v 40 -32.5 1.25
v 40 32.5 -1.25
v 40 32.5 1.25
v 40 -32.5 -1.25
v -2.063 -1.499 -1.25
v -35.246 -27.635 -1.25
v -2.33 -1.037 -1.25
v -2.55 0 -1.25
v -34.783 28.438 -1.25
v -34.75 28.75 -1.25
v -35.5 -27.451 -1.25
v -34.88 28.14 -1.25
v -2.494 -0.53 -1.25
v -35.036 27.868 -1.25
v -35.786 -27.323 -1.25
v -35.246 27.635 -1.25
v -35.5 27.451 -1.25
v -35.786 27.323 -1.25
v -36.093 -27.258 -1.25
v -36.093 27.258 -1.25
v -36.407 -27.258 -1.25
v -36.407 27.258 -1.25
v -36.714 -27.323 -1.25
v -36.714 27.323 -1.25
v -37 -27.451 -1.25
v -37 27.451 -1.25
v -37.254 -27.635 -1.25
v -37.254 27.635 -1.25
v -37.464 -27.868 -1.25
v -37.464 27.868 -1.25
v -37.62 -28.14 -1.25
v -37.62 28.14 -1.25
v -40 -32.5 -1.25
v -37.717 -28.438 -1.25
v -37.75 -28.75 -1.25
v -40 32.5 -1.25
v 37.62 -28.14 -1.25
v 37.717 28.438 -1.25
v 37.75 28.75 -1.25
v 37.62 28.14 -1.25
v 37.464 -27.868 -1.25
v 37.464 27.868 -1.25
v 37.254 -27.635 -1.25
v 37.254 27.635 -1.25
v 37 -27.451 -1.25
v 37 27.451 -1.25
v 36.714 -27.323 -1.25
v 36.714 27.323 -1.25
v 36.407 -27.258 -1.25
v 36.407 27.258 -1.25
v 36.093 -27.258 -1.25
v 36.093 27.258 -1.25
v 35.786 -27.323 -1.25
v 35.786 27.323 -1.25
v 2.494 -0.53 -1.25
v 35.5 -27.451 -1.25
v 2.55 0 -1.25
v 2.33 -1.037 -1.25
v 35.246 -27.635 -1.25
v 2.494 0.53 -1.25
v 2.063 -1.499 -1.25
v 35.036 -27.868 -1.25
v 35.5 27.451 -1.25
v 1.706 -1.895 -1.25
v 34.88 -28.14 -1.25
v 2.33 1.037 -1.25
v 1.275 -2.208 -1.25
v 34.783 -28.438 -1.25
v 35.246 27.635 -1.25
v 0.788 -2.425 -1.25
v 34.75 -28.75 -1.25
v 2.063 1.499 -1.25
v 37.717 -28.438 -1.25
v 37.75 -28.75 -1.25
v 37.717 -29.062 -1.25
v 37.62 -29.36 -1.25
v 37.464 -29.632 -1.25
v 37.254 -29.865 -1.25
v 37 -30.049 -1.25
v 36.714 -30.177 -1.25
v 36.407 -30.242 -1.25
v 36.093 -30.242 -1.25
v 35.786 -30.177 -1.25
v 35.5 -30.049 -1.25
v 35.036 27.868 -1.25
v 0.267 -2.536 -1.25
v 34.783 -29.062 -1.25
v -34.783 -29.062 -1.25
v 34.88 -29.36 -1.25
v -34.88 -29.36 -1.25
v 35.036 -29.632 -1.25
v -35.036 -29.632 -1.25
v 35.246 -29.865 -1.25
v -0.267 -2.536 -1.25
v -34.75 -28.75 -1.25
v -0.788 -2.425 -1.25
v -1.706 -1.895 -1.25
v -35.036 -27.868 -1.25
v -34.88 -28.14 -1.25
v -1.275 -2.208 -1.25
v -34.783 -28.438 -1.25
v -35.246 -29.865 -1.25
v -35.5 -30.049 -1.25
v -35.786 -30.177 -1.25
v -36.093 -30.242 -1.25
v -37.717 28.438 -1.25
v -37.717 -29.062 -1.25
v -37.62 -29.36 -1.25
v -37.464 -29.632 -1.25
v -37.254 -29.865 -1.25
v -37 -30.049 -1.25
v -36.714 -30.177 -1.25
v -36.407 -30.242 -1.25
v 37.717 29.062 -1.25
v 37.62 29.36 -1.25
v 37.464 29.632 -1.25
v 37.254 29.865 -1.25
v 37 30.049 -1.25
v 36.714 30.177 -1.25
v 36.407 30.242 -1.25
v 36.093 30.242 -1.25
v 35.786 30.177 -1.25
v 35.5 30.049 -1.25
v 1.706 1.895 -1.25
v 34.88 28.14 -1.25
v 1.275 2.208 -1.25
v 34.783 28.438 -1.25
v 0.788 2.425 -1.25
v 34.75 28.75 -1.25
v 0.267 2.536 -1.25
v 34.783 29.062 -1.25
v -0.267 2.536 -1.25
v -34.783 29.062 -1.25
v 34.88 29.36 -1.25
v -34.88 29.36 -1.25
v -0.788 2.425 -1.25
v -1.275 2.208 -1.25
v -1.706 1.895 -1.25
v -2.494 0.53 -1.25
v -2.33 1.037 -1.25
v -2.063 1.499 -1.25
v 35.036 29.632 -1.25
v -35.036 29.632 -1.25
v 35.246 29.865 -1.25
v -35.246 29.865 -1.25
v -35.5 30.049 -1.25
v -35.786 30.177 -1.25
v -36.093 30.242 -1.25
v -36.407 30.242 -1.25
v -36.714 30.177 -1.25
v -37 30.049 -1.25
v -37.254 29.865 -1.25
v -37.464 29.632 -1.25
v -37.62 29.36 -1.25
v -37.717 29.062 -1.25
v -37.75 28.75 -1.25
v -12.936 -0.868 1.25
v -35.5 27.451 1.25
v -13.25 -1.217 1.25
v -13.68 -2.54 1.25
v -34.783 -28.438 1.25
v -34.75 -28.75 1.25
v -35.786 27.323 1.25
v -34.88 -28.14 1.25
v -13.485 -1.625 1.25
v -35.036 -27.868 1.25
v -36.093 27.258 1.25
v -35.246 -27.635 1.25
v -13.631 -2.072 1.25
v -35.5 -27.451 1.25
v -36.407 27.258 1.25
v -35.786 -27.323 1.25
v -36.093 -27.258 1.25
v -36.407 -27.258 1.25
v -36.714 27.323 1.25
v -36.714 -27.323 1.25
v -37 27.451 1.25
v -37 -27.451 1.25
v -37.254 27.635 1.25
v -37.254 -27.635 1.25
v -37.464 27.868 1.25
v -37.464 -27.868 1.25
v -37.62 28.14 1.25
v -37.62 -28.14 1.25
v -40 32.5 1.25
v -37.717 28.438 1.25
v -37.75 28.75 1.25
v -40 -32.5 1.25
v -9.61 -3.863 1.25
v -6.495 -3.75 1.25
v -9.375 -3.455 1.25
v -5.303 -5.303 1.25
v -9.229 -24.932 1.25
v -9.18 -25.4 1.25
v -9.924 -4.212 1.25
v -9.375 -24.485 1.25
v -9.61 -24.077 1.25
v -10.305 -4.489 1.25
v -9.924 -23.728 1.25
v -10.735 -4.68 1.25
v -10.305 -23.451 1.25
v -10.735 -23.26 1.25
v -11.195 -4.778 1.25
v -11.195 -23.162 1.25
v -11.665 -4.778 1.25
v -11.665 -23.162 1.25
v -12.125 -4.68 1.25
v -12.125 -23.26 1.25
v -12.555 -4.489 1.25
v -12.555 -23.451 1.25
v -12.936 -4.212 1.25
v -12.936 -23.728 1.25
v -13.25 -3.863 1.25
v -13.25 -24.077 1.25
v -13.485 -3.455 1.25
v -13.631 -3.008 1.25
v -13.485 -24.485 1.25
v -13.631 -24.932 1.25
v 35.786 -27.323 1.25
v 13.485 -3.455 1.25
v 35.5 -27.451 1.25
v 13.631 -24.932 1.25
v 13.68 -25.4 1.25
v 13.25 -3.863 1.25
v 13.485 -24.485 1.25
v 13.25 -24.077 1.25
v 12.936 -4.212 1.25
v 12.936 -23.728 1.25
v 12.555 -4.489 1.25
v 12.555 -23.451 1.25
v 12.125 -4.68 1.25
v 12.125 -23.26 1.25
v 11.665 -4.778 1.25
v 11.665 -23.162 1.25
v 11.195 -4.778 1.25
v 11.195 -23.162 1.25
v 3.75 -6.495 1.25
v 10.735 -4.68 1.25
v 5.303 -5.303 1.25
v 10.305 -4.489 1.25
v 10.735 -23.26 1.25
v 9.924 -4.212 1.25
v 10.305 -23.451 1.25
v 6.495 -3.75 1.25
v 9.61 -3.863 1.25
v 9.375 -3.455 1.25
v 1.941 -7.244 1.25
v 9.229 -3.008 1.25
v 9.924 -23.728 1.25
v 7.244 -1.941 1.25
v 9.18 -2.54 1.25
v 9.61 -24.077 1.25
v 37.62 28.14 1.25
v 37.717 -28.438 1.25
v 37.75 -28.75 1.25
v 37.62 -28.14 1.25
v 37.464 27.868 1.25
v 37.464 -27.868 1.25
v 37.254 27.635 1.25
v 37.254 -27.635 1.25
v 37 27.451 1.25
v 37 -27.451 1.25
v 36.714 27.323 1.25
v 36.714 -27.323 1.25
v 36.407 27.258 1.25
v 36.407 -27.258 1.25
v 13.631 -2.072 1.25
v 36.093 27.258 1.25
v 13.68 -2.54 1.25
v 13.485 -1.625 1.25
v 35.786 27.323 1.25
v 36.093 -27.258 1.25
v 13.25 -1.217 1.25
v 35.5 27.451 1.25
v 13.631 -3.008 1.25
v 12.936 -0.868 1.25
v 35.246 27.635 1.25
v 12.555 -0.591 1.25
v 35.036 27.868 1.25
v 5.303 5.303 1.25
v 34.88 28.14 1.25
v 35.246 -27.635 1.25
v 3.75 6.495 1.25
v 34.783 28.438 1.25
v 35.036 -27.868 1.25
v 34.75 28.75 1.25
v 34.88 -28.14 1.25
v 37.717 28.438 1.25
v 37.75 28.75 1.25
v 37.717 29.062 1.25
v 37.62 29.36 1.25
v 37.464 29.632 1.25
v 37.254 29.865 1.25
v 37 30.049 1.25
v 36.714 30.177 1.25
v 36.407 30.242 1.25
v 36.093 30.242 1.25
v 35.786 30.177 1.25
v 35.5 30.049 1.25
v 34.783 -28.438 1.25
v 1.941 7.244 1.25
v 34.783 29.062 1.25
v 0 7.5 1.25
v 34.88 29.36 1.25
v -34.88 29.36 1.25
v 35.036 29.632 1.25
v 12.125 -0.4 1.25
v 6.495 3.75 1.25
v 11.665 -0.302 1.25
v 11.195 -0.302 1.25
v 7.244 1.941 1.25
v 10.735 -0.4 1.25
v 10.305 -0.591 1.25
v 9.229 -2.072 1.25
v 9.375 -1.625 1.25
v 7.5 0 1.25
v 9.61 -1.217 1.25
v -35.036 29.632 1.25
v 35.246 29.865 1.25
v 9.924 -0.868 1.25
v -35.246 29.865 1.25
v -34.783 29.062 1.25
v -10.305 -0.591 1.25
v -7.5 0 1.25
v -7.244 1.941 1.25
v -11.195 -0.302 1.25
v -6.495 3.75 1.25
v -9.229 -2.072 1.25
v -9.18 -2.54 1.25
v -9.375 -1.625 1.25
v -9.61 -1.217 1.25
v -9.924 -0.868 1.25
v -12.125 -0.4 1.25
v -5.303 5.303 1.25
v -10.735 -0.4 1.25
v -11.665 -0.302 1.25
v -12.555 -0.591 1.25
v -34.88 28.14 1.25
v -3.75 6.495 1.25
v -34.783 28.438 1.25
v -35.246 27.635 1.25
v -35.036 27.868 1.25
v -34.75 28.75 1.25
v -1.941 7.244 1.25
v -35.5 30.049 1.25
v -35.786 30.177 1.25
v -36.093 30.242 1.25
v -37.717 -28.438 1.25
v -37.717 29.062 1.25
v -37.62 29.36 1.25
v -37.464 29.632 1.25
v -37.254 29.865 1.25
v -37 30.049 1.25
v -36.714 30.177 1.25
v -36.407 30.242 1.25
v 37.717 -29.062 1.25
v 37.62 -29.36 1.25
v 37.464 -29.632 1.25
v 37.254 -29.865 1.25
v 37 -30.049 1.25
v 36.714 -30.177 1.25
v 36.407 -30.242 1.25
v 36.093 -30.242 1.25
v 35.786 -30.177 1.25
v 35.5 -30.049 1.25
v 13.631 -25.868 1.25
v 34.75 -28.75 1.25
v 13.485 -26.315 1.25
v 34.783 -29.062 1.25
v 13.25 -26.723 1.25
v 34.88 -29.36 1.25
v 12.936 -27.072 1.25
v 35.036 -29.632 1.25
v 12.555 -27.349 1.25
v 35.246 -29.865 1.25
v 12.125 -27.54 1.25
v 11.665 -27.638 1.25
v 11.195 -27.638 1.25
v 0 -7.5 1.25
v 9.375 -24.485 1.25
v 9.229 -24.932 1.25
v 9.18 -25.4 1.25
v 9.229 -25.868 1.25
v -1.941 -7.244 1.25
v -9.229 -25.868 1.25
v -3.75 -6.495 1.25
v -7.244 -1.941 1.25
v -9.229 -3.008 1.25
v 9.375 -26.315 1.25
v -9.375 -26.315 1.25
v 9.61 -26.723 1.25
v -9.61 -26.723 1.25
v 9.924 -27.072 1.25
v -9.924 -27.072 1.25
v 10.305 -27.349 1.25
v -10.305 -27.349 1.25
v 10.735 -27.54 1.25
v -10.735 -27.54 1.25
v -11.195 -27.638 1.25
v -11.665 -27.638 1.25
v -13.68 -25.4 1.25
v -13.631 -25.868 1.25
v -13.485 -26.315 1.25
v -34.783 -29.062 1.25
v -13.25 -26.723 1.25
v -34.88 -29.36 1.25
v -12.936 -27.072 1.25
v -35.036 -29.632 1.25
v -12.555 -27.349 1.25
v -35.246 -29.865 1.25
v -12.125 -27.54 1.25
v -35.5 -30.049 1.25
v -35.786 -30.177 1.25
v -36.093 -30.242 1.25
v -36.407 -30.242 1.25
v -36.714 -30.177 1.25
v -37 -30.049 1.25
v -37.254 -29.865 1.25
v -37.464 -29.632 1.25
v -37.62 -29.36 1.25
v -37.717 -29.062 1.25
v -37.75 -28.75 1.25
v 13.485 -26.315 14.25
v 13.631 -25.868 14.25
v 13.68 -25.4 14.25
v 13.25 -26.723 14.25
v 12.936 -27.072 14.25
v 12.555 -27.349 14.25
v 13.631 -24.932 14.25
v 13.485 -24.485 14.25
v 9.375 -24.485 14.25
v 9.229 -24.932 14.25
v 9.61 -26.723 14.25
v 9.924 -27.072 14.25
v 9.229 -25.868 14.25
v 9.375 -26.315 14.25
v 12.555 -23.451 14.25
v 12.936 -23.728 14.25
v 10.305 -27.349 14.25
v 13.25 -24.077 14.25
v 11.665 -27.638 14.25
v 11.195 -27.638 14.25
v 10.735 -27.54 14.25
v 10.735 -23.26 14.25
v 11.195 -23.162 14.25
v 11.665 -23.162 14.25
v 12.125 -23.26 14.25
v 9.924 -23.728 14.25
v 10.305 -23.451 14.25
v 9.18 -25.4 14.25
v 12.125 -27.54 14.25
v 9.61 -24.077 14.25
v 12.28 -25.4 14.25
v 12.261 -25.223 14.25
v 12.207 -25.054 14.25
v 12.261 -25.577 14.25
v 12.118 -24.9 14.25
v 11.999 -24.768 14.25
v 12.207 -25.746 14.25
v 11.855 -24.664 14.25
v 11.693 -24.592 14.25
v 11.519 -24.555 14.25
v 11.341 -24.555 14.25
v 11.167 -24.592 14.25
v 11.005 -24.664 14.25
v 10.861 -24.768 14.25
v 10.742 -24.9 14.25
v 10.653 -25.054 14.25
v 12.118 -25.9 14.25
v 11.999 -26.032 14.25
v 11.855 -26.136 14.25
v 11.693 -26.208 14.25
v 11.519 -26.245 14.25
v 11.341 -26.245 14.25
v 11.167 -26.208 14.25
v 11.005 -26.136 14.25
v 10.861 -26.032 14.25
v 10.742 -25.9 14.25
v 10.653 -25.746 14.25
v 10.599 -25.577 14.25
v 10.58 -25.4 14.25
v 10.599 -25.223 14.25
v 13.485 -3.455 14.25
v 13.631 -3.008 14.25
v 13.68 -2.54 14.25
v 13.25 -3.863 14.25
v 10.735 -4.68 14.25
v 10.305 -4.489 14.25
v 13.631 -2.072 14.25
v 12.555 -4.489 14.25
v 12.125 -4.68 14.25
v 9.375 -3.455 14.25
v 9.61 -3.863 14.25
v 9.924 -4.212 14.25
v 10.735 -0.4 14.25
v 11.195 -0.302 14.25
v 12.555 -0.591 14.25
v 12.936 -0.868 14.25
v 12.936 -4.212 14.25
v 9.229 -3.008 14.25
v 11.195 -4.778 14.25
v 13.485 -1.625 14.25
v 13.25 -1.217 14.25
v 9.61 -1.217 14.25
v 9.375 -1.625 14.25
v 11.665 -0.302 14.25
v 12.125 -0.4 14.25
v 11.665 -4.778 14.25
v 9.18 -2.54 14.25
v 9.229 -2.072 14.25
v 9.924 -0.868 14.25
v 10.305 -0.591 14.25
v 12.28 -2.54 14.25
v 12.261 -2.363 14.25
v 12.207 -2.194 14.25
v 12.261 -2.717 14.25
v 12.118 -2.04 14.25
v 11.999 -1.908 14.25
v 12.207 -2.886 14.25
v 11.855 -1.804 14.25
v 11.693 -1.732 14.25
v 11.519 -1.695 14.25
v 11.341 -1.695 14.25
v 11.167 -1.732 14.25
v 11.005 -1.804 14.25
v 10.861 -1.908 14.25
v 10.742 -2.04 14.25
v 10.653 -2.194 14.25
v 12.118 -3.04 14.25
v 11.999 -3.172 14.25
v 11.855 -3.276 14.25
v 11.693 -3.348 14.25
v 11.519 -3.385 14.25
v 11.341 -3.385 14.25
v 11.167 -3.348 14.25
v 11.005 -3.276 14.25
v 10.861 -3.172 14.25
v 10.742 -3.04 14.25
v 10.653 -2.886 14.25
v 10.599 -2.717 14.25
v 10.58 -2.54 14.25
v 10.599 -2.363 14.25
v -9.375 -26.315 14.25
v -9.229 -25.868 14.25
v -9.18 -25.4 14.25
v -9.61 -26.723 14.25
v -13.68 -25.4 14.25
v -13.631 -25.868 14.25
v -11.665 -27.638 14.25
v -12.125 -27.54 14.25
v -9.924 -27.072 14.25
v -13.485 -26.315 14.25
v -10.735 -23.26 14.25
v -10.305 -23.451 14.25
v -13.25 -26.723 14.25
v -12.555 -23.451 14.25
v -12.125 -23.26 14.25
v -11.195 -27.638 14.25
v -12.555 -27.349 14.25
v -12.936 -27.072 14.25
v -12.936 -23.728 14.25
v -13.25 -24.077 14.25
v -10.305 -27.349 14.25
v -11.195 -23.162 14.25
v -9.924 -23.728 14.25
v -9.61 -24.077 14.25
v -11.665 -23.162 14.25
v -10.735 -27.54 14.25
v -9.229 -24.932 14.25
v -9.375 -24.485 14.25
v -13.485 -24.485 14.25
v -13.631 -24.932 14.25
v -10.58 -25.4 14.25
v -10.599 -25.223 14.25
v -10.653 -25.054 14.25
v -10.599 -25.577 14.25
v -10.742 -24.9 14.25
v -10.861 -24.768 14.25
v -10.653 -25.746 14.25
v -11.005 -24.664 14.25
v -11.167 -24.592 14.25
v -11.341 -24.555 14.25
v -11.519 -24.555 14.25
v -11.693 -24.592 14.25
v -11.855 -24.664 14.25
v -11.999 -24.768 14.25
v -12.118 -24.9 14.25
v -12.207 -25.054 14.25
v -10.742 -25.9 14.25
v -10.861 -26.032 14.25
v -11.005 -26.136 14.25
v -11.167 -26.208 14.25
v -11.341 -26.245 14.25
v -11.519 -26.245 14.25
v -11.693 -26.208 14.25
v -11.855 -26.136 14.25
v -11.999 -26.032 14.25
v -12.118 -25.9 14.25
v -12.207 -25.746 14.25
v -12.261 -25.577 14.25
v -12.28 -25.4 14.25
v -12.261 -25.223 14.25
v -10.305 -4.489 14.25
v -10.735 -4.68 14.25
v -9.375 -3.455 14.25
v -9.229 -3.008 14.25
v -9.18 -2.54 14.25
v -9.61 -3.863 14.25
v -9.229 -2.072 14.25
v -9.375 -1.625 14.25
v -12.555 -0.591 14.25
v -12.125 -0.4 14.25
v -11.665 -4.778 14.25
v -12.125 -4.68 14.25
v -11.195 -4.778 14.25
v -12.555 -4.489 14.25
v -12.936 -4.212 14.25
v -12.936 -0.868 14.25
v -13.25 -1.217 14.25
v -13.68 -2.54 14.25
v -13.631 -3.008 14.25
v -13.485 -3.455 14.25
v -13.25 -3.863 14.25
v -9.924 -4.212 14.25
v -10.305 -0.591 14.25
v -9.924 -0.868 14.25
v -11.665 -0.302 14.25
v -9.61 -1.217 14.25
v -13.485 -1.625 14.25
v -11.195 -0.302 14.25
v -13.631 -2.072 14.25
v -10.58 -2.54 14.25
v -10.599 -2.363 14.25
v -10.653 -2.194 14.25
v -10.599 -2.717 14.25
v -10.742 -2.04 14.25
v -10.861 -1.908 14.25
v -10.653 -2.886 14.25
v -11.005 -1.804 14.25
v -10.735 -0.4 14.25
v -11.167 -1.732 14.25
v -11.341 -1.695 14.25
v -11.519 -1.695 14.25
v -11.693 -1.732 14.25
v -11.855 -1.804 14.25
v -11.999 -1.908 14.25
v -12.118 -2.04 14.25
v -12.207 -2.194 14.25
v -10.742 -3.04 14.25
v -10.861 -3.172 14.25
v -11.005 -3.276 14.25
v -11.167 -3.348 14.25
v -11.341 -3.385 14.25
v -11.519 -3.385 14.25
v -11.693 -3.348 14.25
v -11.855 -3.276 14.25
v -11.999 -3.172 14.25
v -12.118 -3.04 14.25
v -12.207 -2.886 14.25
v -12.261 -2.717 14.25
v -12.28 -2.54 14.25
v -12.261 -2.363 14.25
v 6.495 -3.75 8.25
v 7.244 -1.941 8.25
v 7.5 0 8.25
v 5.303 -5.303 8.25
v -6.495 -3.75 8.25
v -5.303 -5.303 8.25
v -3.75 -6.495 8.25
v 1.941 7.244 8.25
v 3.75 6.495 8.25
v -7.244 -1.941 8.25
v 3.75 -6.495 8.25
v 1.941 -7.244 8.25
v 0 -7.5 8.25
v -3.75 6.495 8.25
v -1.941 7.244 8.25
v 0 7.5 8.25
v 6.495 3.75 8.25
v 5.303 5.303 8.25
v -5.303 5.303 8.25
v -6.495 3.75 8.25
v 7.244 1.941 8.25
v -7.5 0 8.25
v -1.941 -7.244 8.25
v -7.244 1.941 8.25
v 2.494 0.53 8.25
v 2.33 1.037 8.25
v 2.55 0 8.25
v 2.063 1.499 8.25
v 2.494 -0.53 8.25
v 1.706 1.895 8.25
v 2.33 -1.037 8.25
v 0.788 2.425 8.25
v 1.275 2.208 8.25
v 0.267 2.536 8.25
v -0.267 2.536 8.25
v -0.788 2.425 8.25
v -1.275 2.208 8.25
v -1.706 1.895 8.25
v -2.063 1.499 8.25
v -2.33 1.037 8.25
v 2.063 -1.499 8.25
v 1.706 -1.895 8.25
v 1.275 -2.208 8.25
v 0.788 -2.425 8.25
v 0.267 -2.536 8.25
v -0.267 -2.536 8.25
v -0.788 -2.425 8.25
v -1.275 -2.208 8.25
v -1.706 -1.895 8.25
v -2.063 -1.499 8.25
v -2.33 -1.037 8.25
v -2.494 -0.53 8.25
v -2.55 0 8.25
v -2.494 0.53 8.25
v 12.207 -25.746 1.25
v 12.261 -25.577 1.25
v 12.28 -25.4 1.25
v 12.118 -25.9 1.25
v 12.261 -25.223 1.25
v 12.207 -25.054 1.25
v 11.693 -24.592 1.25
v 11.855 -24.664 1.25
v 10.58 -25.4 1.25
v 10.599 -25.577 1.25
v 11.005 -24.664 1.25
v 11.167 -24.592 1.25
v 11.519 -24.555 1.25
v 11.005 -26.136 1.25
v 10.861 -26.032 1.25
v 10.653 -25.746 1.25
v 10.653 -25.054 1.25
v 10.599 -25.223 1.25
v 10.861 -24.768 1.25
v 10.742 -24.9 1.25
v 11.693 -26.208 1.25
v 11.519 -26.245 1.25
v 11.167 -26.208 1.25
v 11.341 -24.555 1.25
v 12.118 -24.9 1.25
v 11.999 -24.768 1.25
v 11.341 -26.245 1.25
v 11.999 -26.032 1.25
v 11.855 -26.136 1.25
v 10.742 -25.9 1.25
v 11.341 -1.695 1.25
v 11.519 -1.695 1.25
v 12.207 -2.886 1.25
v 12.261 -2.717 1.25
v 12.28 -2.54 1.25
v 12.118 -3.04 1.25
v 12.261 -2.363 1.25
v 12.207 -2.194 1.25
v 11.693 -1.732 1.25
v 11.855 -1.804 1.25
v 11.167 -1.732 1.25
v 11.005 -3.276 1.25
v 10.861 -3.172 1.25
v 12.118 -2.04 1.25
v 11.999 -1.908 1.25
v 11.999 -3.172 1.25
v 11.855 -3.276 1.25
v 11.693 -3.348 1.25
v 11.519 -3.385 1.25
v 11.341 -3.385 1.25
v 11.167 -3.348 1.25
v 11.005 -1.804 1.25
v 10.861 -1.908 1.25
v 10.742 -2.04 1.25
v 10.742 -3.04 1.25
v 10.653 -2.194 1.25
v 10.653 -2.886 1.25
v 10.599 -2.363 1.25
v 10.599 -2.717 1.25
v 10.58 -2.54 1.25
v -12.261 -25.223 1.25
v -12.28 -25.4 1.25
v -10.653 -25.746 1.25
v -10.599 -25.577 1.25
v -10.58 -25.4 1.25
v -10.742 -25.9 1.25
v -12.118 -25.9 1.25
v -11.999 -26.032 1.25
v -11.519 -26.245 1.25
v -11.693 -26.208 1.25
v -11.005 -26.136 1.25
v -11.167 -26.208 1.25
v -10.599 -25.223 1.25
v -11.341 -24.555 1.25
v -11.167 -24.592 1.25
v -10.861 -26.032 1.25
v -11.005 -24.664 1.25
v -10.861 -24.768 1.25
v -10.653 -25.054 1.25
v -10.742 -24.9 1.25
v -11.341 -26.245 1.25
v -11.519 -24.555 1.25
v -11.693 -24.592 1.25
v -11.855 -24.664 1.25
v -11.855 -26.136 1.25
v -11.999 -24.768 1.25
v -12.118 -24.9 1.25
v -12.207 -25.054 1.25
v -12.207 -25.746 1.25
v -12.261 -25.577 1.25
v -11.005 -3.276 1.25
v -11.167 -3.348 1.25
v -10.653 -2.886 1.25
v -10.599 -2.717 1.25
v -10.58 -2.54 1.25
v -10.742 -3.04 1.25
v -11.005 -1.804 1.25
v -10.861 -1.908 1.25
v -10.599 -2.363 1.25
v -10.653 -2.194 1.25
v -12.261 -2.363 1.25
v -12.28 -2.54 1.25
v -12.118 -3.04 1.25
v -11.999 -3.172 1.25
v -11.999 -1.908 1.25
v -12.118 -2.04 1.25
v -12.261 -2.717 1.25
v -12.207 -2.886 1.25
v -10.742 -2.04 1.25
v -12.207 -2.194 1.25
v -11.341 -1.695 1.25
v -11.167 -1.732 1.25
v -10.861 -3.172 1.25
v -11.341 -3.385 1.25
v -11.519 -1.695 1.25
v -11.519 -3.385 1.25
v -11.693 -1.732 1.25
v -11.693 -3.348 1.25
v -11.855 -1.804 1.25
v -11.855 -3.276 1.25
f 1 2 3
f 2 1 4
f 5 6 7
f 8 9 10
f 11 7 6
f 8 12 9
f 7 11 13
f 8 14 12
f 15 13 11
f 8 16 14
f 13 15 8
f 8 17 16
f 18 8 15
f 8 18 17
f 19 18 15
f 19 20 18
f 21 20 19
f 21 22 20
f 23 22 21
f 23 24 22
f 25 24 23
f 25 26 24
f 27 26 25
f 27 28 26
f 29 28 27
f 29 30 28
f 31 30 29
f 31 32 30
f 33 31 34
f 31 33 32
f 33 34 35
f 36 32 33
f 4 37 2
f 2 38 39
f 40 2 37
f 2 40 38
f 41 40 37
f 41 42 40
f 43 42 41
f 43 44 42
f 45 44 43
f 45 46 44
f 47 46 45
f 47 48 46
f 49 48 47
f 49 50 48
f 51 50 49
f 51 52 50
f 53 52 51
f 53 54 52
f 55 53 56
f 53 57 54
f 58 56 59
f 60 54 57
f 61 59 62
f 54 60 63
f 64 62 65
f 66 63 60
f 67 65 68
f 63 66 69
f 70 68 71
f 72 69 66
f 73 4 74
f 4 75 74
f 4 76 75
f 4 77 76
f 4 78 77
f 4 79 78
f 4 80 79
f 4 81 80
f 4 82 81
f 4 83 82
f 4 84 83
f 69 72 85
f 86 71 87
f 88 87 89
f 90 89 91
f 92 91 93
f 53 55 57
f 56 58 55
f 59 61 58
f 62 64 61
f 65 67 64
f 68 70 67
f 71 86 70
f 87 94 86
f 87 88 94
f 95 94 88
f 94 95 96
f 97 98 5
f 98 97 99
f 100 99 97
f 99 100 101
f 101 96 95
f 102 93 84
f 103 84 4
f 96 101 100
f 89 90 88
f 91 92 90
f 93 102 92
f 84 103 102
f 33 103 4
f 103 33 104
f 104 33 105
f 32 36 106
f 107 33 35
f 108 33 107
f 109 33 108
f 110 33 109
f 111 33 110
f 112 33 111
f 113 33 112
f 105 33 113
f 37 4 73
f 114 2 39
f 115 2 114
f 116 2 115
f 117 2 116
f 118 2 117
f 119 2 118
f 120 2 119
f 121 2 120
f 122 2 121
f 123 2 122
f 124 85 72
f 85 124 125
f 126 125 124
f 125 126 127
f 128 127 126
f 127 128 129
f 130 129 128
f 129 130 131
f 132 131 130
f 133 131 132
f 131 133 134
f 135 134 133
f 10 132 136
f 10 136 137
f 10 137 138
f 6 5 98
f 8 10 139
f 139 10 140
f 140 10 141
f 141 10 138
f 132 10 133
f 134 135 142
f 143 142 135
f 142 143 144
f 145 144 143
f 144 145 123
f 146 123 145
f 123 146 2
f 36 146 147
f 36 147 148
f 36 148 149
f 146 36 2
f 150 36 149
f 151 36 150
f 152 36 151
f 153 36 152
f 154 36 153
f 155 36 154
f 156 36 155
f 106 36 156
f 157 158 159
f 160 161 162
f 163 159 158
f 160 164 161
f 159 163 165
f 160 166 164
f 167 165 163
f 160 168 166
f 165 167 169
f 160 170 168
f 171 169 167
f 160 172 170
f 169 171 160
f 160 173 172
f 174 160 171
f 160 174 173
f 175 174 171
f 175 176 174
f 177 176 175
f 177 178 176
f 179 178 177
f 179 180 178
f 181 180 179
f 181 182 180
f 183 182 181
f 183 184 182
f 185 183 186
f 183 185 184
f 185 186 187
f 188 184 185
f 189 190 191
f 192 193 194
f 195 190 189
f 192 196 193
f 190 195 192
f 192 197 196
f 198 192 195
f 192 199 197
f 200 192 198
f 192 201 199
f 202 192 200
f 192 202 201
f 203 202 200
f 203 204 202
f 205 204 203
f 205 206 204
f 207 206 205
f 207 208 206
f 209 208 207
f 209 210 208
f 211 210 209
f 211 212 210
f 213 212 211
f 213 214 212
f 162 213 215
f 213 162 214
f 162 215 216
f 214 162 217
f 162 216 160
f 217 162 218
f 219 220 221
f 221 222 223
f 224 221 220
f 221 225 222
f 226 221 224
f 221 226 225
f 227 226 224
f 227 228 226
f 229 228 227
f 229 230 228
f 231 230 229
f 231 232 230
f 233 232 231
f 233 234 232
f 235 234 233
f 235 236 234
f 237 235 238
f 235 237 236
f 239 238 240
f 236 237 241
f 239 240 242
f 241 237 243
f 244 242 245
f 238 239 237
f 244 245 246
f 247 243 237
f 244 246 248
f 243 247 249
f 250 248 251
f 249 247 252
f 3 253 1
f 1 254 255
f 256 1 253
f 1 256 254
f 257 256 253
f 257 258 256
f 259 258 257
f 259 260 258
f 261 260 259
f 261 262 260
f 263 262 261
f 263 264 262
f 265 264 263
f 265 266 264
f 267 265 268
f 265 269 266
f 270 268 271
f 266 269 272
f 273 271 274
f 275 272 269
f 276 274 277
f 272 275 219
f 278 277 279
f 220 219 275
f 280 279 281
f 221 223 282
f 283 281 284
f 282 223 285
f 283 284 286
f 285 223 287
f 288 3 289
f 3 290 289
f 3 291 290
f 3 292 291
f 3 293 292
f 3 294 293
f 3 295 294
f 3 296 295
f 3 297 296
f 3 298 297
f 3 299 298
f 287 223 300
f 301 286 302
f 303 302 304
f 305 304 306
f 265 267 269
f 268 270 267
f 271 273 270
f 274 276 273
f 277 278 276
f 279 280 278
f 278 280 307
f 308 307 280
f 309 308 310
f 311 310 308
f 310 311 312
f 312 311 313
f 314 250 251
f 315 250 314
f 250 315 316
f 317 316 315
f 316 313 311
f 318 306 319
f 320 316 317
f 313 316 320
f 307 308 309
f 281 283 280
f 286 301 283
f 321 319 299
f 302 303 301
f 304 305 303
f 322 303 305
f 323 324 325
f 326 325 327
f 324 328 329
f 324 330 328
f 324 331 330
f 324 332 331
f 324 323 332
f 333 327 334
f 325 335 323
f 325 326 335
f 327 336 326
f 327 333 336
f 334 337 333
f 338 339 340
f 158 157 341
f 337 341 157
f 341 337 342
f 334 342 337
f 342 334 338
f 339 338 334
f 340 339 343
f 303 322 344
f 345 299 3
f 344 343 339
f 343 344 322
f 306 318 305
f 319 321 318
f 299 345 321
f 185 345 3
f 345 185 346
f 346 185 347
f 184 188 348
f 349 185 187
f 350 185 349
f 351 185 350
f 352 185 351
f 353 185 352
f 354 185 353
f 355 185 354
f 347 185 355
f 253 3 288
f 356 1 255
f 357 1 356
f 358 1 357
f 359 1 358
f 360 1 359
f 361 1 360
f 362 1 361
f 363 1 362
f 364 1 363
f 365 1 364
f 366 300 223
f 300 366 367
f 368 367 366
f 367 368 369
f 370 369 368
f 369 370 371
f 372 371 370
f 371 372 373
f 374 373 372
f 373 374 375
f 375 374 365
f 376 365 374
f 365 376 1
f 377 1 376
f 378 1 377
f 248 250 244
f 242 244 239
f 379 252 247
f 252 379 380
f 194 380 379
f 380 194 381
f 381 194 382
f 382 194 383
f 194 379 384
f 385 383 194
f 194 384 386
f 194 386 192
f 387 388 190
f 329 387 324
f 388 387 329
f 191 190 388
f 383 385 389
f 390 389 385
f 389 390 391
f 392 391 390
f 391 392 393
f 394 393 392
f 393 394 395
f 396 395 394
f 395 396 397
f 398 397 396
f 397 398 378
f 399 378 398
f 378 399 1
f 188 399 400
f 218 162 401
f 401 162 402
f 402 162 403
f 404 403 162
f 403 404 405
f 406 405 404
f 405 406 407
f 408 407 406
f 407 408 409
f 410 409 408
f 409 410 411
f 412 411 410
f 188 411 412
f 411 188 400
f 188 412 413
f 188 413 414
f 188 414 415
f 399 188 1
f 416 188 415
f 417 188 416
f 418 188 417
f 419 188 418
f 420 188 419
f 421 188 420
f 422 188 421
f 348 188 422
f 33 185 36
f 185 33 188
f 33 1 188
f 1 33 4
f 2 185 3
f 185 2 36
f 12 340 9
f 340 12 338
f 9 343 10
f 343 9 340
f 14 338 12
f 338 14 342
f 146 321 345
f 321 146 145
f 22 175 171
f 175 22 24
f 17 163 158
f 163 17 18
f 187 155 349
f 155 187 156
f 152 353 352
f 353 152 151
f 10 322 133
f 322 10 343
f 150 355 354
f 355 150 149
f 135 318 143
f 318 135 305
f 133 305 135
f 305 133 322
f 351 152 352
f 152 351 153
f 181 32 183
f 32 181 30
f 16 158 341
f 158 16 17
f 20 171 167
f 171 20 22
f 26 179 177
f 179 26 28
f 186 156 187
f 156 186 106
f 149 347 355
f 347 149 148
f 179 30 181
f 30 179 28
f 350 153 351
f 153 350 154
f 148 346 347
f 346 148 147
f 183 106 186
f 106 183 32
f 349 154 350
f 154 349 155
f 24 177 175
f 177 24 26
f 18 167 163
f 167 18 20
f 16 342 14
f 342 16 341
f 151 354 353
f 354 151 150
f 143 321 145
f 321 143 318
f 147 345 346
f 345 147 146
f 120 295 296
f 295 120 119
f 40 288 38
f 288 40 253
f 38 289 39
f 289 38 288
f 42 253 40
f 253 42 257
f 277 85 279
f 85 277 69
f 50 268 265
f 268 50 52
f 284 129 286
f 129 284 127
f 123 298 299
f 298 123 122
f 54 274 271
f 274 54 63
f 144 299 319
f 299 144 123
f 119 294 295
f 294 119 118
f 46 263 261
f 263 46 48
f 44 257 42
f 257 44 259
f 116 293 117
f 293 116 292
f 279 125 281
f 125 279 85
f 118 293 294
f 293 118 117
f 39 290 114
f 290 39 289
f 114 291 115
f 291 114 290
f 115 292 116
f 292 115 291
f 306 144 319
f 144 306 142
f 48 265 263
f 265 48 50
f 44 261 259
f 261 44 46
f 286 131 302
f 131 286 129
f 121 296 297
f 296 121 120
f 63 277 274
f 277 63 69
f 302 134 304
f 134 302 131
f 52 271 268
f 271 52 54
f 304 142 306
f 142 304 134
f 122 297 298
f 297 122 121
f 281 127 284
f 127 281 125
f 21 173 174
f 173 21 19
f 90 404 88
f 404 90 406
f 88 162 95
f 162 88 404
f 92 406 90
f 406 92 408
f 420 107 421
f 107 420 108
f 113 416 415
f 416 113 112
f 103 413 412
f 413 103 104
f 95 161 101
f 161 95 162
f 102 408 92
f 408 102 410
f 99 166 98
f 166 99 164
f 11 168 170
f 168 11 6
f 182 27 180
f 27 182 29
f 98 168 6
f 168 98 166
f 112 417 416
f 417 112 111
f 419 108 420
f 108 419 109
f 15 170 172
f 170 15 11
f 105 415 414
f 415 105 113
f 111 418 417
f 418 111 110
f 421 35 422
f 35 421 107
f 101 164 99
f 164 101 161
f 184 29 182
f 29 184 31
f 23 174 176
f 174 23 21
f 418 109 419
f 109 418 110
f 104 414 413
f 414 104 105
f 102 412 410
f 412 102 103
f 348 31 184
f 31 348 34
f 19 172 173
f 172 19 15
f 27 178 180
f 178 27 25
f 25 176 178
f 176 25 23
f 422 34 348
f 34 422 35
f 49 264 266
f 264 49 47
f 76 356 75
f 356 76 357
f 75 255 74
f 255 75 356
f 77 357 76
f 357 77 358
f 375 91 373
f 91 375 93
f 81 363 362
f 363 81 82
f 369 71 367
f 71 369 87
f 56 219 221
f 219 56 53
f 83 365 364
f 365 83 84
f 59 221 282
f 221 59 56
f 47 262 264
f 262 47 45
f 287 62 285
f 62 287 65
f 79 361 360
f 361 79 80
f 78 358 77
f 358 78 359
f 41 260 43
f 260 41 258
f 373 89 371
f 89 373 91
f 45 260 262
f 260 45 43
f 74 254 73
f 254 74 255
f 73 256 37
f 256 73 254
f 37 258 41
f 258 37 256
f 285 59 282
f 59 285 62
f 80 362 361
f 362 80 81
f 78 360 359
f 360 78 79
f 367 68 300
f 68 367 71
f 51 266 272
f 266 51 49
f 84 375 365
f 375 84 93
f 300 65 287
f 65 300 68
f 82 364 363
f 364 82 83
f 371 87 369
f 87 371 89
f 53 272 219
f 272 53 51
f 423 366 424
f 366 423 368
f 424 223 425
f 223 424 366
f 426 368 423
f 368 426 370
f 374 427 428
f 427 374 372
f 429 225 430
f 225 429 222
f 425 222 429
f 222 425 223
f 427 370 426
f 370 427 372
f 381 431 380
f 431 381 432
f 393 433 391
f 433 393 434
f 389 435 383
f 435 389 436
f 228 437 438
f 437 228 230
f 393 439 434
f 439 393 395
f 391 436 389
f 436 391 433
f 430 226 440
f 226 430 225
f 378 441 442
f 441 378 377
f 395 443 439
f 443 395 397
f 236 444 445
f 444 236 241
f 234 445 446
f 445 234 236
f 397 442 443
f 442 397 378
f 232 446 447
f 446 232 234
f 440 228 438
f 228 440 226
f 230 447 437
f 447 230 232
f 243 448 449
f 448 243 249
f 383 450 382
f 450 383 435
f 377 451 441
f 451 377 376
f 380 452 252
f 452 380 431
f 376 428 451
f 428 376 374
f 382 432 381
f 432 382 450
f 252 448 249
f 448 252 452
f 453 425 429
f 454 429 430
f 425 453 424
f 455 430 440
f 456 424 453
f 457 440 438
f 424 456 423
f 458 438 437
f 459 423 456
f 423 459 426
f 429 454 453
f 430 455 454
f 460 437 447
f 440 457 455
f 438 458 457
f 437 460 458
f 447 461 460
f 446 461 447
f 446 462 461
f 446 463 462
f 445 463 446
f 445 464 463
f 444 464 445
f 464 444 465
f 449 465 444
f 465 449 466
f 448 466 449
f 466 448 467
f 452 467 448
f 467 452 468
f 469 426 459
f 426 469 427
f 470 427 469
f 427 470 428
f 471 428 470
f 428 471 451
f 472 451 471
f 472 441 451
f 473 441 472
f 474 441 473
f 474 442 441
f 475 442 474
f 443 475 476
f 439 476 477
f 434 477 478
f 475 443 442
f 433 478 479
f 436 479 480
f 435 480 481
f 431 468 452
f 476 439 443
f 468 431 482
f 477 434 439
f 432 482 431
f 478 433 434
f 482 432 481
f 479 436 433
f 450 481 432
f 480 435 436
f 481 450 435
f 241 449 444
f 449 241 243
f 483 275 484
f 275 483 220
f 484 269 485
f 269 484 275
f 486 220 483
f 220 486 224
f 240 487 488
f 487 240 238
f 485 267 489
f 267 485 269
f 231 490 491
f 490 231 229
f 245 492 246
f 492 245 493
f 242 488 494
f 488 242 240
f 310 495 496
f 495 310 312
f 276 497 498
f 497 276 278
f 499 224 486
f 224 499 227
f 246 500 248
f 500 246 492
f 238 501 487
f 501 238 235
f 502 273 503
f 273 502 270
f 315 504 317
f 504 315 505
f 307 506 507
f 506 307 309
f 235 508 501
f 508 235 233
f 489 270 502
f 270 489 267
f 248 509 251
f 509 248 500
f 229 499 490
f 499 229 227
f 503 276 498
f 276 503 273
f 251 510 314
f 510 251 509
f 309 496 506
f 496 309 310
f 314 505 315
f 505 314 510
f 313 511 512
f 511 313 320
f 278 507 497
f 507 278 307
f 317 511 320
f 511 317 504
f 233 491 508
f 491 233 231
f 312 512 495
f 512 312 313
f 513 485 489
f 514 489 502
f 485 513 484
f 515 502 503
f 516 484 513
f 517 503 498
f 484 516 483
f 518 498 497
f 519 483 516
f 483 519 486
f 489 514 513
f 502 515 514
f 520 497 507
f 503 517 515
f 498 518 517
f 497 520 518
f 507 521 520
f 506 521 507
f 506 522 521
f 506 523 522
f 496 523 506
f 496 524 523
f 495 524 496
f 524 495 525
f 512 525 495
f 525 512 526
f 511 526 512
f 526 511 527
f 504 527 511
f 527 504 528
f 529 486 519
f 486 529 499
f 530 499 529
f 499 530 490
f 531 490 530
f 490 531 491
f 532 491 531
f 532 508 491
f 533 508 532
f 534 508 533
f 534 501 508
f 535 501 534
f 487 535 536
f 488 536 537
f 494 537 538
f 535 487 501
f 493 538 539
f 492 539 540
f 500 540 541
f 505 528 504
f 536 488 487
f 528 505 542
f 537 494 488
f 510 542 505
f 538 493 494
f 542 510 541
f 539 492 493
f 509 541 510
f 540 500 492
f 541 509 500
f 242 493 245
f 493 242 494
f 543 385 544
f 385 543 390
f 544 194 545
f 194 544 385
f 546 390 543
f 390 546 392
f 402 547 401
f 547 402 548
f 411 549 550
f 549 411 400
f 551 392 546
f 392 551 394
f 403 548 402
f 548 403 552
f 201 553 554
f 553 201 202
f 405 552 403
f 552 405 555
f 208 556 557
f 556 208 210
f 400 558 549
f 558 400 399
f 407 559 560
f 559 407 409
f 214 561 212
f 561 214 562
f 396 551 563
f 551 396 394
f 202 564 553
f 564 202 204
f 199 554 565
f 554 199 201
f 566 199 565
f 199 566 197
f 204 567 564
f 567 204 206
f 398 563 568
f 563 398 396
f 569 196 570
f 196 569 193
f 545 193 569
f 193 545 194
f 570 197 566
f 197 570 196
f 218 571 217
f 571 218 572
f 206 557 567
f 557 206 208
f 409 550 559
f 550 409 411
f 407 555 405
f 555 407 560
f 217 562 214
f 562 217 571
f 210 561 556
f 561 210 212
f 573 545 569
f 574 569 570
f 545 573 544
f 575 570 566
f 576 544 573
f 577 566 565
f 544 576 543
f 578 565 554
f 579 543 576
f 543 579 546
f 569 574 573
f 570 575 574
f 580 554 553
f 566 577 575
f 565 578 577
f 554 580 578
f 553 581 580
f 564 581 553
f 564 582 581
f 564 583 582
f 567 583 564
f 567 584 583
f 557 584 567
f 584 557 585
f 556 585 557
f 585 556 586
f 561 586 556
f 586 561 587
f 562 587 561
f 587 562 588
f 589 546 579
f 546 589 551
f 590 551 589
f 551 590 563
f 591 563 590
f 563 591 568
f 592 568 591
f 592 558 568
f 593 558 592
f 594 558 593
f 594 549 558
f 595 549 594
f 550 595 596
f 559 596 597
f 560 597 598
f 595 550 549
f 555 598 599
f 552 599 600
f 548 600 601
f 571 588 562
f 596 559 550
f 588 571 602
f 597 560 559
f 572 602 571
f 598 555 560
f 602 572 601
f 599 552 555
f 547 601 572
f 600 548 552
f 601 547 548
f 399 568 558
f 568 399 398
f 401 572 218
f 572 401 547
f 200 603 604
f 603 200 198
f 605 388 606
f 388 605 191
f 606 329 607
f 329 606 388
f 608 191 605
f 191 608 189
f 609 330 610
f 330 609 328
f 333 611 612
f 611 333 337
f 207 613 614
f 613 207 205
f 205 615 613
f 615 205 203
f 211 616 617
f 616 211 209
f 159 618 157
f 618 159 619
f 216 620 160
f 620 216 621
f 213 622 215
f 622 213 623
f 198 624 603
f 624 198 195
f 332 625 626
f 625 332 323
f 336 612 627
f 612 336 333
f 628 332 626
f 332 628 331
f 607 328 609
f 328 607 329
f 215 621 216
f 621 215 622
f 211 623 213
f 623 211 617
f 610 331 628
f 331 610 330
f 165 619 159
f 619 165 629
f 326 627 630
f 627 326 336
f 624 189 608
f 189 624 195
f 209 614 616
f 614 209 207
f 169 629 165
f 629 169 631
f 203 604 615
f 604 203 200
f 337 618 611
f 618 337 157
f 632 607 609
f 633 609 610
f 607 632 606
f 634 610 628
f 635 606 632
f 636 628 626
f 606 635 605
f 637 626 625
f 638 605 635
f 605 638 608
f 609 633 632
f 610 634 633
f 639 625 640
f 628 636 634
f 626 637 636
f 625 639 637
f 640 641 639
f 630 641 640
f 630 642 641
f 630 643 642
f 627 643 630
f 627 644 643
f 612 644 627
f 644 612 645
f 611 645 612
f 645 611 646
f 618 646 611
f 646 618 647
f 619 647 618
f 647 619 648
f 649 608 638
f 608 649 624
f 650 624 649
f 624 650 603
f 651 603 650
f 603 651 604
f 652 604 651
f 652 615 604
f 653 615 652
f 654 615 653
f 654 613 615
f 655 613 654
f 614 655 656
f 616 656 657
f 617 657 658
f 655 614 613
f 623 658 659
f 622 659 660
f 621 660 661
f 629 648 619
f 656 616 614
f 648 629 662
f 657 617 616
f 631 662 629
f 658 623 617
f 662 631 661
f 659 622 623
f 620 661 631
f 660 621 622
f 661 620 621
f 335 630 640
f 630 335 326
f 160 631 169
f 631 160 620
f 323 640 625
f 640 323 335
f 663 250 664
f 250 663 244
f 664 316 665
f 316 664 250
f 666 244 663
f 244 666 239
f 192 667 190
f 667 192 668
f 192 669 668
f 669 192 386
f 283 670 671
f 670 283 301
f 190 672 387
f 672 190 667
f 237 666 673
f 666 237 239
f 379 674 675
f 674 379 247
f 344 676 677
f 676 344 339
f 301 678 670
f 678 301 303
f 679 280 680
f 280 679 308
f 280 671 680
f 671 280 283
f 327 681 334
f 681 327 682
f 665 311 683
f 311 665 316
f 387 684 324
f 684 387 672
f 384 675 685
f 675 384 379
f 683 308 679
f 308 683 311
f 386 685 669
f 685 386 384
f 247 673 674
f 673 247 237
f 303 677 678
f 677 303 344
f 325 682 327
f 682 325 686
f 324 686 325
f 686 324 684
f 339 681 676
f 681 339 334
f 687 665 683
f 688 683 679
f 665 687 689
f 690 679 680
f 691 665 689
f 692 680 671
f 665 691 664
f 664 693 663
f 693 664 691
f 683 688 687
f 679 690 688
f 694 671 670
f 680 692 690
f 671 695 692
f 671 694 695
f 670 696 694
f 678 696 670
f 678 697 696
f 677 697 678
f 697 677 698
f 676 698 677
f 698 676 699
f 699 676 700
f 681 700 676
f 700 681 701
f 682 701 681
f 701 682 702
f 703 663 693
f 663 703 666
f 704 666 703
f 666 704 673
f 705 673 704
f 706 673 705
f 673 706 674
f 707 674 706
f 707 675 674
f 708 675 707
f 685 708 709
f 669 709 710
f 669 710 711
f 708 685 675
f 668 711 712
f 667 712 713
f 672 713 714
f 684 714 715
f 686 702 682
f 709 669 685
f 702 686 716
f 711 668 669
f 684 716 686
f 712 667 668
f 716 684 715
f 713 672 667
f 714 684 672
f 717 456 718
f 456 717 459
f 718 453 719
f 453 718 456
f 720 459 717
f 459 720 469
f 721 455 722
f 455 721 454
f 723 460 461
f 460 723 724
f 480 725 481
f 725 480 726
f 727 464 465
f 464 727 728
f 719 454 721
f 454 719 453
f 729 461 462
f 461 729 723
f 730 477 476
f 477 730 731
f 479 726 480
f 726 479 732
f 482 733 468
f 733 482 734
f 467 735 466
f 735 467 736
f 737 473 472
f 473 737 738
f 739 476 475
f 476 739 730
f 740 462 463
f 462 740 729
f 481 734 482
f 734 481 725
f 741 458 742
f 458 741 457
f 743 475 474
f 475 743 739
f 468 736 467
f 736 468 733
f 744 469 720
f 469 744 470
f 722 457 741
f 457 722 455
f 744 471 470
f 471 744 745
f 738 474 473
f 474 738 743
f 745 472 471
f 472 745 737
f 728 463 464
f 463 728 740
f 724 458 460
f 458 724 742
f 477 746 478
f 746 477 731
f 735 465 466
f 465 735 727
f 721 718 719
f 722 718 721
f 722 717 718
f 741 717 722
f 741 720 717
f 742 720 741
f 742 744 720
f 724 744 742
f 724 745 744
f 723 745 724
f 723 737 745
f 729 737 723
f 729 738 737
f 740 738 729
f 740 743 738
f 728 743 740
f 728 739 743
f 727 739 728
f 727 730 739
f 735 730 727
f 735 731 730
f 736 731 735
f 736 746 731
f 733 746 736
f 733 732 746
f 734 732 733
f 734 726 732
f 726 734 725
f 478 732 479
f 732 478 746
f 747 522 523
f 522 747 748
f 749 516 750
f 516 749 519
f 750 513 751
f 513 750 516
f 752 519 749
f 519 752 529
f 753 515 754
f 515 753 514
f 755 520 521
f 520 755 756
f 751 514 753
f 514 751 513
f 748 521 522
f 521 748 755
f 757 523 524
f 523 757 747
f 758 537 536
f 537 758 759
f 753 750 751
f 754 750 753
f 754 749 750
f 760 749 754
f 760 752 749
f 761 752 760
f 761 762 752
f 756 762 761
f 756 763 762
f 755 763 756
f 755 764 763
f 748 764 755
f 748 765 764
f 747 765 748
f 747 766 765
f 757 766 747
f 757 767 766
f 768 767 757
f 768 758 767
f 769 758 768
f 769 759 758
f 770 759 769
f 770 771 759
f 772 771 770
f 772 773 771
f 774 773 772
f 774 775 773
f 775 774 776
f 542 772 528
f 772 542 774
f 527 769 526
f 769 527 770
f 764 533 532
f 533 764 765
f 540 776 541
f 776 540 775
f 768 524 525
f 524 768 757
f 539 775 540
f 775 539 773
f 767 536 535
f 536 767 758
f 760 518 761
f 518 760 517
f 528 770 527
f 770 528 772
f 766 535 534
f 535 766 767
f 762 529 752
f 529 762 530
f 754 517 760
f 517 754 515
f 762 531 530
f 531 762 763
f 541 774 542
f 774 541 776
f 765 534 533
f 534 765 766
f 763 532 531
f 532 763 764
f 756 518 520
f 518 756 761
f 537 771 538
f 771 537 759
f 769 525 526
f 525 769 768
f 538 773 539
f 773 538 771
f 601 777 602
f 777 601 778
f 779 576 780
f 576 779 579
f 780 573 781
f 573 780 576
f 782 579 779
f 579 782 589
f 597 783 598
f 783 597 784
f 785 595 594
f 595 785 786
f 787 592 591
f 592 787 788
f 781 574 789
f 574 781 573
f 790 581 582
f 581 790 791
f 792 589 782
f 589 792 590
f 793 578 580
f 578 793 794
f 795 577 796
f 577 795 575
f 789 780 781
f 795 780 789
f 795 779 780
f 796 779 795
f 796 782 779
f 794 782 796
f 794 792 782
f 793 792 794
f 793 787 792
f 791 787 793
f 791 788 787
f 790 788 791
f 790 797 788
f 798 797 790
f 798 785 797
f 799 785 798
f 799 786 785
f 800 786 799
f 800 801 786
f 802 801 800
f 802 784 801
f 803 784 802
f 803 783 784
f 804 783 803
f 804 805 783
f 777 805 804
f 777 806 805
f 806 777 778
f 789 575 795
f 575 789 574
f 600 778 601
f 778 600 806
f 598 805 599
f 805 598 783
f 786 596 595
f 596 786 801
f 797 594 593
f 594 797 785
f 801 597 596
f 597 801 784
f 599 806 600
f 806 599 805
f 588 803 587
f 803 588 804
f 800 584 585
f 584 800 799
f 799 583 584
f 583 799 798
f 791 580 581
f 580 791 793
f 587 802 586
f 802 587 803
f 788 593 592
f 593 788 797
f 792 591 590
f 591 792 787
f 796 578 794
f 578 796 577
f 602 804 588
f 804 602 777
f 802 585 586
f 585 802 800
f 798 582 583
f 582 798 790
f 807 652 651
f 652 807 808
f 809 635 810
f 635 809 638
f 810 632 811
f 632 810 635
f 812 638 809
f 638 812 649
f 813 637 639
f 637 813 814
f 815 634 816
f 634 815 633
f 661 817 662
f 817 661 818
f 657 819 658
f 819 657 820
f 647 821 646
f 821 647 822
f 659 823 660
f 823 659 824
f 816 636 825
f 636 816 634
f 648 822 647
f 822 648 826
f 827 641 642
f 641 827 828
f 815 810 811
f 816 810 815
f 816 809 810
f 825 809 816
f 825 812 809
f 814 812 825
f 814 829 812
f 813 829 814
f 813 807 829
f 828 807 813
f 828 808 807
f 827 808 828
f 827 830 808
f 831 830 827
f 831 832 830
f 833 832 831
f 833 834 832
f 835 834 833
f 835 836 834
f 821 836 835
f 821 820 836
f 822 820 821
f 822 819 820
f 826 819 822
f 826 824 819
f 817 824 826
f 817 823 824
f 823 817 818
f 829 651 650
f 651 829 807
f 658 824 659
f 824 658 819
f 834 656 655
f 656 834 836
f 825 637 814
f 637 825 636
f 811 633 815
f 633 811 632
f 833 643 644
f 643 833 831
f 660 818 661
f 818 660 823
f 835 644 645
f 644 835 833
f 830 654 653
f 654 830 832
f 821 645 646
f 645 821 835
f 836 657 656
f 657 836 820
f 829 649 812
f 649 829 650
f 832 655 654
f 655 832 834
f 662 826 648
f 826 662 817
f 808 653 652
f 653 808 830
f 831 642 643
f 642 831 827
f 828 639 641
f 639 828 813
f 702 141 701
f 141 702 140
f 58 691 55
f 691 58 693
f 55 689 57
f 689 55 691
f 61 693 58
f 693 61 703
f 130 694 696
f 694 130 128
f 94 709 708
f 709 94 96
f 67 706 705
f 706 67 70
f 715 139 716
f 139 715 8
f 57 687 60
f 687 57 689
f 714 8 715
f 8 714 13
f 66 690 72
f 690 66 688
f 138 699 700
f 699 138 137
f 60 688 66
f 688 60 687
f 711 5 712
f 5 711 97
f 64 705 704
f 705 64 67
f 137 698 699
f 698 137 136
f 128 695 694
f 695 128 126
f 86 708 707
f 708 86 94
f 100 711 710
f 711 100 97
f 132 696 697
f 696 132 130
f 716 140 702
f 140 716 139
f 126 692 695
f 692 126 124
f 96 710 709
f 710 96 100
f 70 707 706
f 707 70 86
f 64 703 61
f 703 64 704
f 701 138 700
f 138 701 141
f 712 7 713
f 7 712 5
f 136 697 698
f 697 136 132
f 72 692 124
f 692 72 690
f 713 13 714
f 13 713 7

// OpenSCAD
xdim=75;
ydim=60;
zdim=70;
th=2.5;

BOX=1;
COVER=2;
item=BOX;
item=COVER;

if (item==BOX) {
    difference() {
        union() {
            difference() {
                cube([xdim+2*th,ydim+2*th,zdim+th],true);
                translate([0,0,th/2]) cube([xdim,ydim,zdim],true);
            }
            translate([-(xdim/2-th/2),-(ydim/2-th/2),th/2]) {
                cylinder(h=zdim,d=5,$fn=30,center=true);
            }
            translate([(xdim/2-th/2),-(ydim/2-th/2),th/2]) {
                cylinder(h=zdim,d=5,$fn=30,center=true);
            }
            translate([-(xdim/2-th/2),(ydim/2-th/2),th/2]) {
                cylinder(h=zdim,d=5,$fn=30,center=true);
            }
            translate([(xdim/2-th/2),(ydim/2-th/2),th/2]) {
                cylinder(h=zdim,d=5,$fn=30,center=true);
            }
        }
        translate([-xdim/2,-ydim/2+21,0]) {
            translate([0,20,-5]) switch();
            // aerial
            translate([0,1,-zdim/2+54.5]) rotate([90,0,90]) cylinder(h=10,d=11,$fn=30,center=true);
            // LED
            translate([0,20,-25]) rotate([90,0,90]) cylinder(h=10,d=5.1,$fn=30,center=true);
        }

        // USB
        translate([-xdim/2+30,-ydim/2+25.5+2,-zdim/2]) usb();
        translate([0,-ydim/2,0]) tripod();

        // holes
        translate([-(xdim/2-th/2),-(ydim/2-th/2),th/2]) {
            cylinder(h=zdim,d=2,$fn=30,center=true);
        }
        translate([(xdim/2-th/2),-(ydim/2-th/2),th/2]) {
            cylinder(h=zdim,d=2,$fn=30,center=true);
        }
        translate([-(xdim/2-th/2),(ydim/2-th/2),th/2]) {
            cylinder(h=zdim,d=2,$fn=30,center=true);
        }
        translate([(xdim/2-th/2),(ydim/2-th/2),th/2]) {
            cylinder(h=zdim,d=2,$fn=30,center=true);
        }
        
    }

    translate([xdim/2-17.5/2,ydim/2-30/2-10,-zdim/2+20+th/2]) battery_holder();
} else if(item==COVER) {
    rotate([180,0,0]) {
        difference() {
            union() {
                difference() {
                    cube([xdim+2*th,ydim+2*th,th],true);
                    // screw holes
                    translate([-(xdim/2-th/2),-(ydim/2-th/2),th/2]) {
                        cylinder(h=zdim,d=3,$fn=30,center=true);
                    }
                    translate([(xdim/2-th/2),-(ydim/2-th/2),th/2]) {
                        cylinder(h=zdim,d=3,$fn=30,center=true);
                    }
                    translate([-(xdim/2-th/2),(ydim/2-th/2),th/2]) {
                        cylinder(h=zdim,d=3,$fn=30,center=true);
                    }
                    translate([(xdim/2-th/2),(ydim/2-th/2),th/2]) {
                        cylinder(h=zdim,d=3,$fn=30,center=true);
                    }
                    
                    
                    
                }
                // breakout board mounts
                translate([0,22.86/2+2.54,-13/2-th/2]) {
                    translate([22.86/2,22.86/2,0]) {
                        cylinder(h=13,d=4.5,$fn=30,center=true);
                    }
                    translate([22.86/2,-22.86/2,0]) {
                        cylinder(h=13,d=4.5,$fn=30,center=true);
                    }
                    translate([-22.86/2,22.86/2,0]) {
                        cylinder(h=13,d=4.5,$fn=30,center=true);
                    }
                    translate([-22.86/2,-22.86/2,0]) {
                        cylinder(h=13,d=4.5,$fn=30,center=true);
                    }
                }
                
                // photodiode pinhole
                translate([0,0,-7/2-th/2]) cylinder(d=15,h=7,center=true);
            }
            // photodiode hole
            translate([0,0,0]) {
                cylinder(h=zdim,d=5.1,$fn=30,center=true);
            }
            // breakout board mounts
            translate([0,22.86/2+2.54,-13/2-th/2]) {
                translate([22.86/2,22.86/2,0]) {
                    cylinder(h=13,d=1.7,$fn=30,center=true);
                }
                translate([22.86/2,-22.86/2,0]) {
                    cylinder(h=13,d=1.7,$fn=30,center=true);
                }
                translate([-22.86/2,22.86/2,0]) {
                    cylinder(h=13,d=1.7,$fn=30,center=true);
                }
                translate([-22.86/2,-22.86/2,0]) {
                    cylinder(h=13,d=1.7,$fn=30,center=true);
                }
            }
            
            
        }  
    }  
}

module battery_holder() 
{
    difference() {
        cube([17.5+th*2,30+th*2,40+th*2],true);
        translate([0,0,th]) cube([17.5,30,40+th*2],true);
    }
}

module switch() 
{
    rotate([90,0,90]) {
        translate([0,15/2,0]) cylinder(d=3,h=10,$fn=30,center=true);
        translate([0,-15/2,0]) cylinder(d=3,h=10,$fn=30,center=true);
        translate([0,0,0]) cube([4,7,10],true);
    }
}

module usb() 
{
    rotate([-90,0,0]) hull() {
        cube([8,10,2],true);
        translate([0,0,-2.5]) cube([7,10,2],true);
    }
}

module tripod()
{
    rotate([90,0,0]) {
        cylinder(h=10,d=9,center=true);
        translate([0,8,0]) cylinder(h=10,d=3,$fn=30,center=true);
        rotate([0,0,120]) translate([0,8,0]) cylinder(h=10,d=3,$fn=30,center=true);
        rotate([0,0,-120]) translate([0,8,0]) cylinder(h=10,d=3,$fn=30,center=true);
    }
}
